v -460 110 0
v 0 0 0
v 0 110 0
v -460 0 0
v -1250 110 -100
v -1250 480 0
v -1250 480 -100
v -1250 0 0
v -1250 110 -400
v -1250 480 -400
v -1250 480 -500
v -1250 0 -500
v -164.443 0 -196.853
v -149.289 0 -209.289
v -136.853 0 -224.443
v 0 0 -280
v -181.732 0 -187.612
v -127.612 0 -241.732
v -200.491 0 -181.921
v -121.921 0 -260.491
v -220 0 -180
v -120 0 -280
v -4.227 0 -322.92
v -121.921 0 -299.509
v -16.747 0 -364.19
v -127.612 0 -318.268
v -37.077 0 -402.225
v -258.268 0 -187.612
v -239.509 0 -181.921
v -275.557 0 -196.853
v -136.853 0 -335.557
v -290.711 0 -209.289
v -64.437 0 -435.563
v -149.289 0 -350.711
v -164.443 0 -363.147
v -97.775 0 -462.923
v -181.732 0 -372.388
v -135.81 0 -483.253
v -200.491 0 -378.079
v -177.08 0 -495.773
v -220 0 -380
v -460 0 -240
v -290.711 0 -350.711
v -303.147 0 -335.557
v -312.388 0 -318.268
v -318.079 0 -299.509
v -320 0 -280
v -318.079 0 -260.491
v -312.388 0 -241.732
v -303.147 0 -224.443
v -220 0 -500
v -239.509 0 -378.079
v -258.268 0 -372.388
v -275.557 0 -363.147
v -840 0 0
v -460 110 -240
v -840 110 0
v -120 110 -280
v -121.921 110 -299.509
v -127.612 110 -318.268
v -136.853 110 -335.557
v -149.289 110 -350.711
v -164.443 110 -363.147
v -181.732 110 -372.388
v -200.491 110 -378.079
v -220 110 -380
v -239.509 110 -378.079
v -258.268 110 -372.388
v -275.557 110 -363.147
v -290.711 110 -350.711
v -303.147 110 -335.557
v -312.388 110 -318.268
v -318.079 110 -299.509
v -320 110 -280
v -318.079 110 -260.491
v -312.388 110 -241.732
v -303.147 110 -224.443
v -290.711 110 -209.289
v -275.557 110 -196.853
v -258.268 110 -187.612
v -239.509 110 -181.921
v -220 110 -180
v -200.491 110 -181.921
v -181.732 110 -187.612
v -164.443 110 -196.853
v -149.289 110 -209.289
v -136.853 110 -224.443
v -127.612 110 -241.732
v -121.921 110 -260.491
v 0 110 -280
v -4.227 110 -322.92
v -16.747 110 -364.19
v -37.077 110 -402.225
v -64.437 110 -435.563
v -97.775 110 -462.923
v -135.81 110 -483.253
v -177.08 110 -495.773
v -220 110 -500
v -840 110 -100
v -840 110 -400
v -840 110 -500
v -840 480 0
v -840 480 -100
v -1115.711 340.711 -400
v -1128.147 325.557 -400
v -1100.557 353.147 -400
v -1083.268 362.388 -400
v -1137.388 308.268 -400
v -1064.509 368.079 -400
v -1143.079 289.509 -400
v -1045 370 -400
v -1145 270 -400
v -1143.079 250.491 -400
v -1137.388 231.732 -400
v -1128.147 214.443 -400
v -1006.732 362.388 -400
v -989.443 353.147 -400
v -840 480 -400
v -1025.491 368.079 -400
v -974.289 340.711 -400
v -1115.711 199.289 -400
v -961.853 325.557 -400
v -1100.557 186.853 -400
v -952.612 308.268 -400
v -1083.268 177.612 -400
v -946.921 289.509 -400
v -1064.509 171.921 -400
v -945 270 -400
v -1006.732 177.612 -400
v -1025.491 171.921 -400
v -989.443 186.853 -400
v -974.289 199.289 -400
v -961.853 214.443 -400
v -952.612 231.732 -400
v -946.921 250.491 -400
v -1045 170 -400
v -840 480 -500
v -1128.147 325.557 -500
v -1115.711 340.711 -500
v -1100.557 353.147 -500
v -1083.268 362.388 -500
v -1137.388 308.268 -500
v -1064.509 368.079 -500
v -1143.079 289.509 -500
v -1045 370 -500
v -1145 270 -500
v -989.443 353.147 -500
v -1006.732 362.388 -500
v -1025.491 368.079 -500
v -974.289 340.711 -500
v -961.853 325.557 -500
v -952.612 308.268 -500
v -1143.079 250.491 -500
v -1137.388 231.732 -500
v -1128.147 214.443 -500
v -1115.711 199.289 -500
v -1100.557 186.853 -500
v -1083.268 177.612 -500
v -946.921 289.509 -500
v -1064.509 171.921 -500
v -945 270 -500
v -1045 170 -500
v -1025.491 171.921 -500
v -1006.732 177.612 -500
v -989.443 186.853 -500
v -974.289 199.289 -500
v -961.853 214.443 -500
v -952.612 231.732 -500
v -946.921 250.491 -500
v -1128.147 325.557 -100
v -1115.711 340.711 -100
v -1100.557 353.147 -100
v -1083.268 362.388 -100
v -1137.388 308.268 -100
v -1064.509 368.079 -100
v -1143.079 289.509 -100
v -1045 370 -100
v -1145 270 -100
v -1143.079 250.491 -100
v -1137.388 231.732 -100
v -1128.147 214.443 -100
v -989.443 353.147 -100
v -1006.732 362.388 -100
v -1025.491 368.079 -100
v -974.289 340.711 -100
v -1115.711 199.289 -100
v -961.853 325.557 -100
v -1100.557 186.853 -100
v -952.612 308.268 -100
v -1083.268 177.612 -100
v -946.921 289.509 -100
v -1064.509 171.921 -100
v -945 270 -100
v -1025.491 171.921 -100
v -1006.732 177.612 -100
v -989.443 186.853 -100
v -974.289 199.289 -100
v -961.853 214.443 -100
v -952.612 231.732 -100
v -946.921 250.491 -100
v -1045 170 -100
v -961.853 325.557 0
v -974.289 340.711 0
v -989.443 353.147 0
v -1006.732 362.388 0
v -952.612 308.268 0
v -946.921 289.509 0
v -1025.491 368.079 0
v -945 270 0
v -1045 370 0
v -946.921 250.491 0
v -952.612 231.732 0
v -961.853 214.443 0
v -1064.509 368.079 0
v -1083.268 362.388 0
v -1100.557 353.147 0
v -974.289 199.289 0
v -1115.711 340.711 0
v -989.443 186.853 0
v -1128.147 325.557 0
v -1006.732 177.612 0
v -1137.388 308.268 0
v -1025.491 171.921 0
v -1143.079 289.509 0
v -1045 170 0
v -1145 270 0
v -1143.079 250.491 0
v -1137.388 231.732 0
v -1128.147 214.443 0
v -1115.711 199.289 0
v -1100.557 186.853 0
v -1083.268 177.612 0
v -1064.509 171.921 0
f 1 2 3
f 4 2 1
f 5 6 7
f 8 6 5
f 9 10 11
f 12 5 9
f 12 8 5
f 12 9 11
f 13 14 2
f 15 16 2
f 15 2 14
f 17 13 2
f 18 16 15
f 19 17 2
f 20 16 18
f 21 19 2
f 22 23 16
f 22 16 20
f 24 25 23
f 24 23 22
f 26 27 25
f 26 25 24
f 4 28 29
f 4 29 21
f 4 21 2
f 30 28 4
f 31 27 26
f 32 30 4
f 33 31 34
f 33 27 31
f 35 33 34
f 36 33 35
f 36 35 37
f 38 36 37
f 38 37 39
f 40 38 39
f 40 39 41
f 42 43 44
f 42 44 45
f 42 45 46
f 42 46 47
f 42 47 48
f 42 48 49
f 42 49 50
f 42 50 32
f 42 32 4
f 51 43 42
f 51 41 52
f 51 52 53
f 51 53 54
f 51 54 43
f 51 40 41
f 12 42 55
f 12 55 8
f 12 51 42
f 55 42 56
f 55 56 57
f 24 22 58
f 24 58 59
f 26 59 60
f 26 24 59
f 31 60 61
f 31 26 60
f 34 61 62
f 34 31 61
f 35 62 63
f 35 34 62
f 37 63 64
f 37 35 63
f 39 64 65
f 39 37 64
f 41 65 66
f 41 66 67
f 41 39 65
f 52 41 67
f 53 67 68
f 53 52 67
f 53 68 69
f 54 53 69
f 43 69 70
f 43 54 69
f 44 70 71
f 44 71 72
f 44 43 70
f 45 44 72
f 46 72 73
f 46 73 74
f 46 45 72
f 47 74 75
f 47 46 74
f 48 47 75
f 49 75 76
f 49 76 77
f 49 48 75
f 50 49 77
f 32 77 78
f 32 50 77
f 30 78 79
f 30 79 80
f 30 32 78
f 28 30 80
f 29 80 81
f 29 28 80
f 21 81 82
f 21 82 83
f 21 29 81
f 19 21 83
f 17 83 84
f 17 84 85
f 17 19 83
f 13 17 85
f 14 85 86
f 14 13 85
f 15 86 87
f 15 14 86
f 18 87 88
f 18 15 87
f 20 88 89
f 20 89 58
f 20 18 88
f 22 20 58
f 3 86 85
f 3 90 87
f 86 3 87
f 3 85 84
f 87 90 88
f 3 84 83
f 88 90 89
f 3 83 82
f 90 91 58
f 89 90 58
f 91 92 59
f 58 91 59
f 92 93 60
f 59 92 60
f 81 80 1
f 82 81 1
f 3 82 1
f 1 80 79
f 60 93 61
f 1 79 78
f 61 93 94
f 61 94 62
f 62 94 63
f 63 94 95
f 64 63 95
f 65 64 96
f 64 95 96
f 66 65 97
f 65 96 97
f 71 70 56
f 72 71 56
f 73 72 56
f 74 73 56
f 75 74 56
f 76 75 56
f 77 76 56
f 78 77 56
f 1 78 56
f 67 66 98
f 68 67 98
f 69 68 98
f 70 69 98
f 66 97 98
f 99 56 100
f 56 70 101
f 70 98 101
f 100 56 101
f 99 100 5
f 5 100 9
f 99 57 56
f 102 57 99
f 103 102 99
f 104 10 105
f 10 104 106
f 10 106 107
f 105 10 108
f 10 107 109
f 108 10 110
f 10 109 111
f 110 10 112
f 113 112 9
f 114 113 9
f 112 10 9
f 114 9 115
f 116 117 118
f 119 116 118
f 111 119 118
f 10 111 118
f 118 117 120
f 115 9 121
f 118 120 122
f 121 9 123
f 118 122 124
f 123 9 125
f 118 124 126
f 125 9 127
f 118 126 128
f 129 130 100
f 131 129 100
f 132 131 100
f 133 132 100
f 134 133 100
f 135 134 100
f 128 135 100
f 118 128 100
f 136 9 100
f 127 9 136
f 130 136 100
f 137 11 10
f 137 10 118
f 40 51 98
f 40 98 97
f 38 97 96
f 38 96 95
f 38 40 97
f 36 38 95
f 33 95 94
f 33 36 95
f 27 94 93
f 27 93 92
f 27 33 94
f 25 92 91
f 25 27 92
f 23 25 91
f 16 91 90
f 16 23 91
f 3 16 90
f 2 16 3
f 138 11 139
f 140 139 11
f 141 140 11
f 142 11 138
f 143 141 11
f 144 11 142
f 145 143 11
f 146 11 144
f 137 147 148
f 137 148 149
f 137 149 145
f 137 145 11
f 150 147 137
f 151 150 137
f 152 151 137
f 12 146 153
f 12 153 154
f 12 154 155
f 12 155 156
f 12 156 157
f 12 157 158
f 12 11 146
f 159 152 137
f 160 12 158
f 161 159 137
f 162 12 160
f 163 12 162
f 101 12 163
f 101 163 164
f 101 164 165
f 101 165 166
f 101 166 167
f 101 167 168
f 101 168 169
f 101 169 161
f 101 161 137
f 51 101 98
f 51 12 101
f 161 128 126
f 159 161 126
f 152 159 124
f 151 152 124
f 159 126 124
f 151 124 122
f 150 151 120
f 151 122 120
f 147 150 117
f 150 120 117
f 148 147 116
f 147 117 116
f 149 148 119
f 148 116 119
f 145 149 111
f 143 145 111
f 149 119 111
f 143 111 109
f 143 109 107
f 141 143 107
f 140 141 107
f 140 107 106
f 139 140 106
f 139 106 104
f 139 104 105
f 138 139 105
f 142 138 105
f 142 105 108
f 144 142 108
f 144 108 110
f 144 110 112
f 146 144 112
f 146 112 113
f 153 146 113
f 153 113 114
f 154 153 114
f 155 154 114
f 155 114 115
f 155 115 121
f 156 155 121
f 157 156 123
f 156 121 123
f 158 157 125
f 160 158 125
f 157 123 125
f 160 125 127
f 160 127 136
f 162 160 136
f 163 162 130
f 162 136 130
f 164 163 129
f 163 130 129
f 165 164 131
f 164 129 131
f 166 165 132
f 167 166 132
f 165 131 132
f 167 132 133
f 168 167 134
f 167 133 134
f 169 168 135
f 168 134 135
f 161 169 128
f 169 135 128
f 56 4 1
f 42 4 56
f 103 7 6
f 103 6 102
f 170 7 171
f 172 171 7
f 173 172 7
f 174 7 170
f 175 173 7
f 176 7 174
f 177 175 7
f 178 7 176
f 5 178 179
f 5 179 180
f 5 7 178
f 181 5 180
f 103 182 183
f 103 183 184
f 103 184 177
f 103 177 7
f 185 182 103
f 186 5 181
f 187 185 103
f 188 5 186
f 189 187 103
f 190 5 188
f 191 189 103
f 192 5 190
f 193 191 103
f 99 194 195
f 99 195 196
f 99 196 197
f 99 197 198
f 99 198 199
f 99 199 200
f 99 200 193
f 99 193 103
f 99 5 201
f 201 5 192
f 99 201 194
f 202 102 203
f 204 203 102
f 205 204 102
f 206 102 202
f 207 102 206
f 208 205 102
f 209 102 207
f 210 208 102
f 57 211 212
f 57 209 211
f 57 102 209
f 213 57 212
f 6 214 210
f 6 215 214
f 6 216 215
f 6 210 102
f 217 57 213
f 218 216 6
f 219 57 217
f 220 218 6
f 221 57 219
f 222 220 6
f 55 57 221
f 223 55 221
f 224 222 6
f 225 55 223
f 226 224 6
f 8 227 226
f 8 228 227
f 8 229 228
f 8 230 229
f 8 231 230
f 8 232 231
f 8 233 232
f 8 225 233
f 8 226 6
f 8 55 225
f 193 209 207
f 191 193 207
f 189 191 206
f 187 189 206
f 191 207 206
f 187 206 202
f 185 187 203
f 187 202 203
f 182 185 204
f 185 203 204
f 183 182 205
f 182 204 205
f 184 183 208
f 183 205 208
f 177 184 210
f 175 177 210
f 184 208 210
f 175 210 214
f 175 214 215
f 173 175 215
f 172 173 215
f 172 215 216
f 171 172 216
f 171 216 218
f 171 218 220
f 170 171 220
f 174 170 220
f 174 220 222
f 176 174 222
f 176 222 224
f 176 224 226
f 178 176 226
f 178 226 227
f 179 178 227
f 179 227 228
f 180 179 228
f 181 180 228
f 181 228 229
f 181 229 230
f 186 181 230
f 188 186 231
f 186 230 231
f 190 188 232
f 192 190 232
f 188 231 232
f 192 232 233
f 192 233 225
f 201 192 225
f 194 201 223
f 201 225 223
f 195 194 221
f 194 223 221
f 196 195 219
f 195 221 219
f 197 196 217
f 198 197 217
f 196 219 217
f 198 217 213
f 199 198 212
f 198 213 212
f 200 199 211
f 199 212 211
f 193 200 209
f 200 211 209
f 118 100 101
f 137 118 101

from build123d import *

# Parameters (mm, degrees)
SKETCH1_R           = 100
BOSS_EXTRUDE1_DEPTH = 110
SKETCH2_W           = 410
SKETCH2_H           = 100
BOSS_EXTRUDE2_DEPTH = 370
SKETCH3_R           = 100
CUT_EXTRUDE1_DEPTH  = 501


with BuildPart() as part:
    # Sketch1 → Boss-Extrude1 (new body)
    with BuildSketch(Plane(origin=(0, 0, 0), x_dir=(1, 0, 0), z_dir=(0, 1, 0))):
        with BuildLine():
            Line((-460, 0), (-460, 240))
            Line((-460, 240), (-840, 0))
            Line((-840, 0), (-1250, 0))
            Line((-1250, 0), (-1250, 500))
            Line((-1250, 500), (-220, 500))
            ThreePointArc((-220, 500), (-64.436508139, 435.563491861), (0, 280))
            Line((0, 280), (0, 0))
            Line((0, 0), (-460, 0))
        make_face()
        with Locations((-220, 280)):
            Circle(SKETCH1_R, mode=Mode.SUBTRACT)
    extrude(amount=BOSS_EXTRUDE1_DEPTH)

    # Sketch2 → Boss-Extrude2 (add)
    with BuildSketch(Plane(origin=(0, 110, 0), x_dir=(1, 0, 0), z_dir=(0, 1, 0))):
        with Locations((-1045, 450)):
            Rectangle(SKETCH2_W, SKETCH2_H)
        with Locations((-1045, 50)):
            Rectangle(SKETCH2_W, SKETCH2_H)
    extrude(amount=BOSS_EXTRUDE2_DEPTH)

    # Sketch3 → Cut-Extrude1 (cut, through all)
    with BuildSketch(Plane.XY):
        with Locations((-1045, 270)):
            Circle(SKETCH3_R)
    extrude(amount=-CUT_EXTRUDE1_DEPTH, mode=Mode.SUBTRACT)


solid = part.part
